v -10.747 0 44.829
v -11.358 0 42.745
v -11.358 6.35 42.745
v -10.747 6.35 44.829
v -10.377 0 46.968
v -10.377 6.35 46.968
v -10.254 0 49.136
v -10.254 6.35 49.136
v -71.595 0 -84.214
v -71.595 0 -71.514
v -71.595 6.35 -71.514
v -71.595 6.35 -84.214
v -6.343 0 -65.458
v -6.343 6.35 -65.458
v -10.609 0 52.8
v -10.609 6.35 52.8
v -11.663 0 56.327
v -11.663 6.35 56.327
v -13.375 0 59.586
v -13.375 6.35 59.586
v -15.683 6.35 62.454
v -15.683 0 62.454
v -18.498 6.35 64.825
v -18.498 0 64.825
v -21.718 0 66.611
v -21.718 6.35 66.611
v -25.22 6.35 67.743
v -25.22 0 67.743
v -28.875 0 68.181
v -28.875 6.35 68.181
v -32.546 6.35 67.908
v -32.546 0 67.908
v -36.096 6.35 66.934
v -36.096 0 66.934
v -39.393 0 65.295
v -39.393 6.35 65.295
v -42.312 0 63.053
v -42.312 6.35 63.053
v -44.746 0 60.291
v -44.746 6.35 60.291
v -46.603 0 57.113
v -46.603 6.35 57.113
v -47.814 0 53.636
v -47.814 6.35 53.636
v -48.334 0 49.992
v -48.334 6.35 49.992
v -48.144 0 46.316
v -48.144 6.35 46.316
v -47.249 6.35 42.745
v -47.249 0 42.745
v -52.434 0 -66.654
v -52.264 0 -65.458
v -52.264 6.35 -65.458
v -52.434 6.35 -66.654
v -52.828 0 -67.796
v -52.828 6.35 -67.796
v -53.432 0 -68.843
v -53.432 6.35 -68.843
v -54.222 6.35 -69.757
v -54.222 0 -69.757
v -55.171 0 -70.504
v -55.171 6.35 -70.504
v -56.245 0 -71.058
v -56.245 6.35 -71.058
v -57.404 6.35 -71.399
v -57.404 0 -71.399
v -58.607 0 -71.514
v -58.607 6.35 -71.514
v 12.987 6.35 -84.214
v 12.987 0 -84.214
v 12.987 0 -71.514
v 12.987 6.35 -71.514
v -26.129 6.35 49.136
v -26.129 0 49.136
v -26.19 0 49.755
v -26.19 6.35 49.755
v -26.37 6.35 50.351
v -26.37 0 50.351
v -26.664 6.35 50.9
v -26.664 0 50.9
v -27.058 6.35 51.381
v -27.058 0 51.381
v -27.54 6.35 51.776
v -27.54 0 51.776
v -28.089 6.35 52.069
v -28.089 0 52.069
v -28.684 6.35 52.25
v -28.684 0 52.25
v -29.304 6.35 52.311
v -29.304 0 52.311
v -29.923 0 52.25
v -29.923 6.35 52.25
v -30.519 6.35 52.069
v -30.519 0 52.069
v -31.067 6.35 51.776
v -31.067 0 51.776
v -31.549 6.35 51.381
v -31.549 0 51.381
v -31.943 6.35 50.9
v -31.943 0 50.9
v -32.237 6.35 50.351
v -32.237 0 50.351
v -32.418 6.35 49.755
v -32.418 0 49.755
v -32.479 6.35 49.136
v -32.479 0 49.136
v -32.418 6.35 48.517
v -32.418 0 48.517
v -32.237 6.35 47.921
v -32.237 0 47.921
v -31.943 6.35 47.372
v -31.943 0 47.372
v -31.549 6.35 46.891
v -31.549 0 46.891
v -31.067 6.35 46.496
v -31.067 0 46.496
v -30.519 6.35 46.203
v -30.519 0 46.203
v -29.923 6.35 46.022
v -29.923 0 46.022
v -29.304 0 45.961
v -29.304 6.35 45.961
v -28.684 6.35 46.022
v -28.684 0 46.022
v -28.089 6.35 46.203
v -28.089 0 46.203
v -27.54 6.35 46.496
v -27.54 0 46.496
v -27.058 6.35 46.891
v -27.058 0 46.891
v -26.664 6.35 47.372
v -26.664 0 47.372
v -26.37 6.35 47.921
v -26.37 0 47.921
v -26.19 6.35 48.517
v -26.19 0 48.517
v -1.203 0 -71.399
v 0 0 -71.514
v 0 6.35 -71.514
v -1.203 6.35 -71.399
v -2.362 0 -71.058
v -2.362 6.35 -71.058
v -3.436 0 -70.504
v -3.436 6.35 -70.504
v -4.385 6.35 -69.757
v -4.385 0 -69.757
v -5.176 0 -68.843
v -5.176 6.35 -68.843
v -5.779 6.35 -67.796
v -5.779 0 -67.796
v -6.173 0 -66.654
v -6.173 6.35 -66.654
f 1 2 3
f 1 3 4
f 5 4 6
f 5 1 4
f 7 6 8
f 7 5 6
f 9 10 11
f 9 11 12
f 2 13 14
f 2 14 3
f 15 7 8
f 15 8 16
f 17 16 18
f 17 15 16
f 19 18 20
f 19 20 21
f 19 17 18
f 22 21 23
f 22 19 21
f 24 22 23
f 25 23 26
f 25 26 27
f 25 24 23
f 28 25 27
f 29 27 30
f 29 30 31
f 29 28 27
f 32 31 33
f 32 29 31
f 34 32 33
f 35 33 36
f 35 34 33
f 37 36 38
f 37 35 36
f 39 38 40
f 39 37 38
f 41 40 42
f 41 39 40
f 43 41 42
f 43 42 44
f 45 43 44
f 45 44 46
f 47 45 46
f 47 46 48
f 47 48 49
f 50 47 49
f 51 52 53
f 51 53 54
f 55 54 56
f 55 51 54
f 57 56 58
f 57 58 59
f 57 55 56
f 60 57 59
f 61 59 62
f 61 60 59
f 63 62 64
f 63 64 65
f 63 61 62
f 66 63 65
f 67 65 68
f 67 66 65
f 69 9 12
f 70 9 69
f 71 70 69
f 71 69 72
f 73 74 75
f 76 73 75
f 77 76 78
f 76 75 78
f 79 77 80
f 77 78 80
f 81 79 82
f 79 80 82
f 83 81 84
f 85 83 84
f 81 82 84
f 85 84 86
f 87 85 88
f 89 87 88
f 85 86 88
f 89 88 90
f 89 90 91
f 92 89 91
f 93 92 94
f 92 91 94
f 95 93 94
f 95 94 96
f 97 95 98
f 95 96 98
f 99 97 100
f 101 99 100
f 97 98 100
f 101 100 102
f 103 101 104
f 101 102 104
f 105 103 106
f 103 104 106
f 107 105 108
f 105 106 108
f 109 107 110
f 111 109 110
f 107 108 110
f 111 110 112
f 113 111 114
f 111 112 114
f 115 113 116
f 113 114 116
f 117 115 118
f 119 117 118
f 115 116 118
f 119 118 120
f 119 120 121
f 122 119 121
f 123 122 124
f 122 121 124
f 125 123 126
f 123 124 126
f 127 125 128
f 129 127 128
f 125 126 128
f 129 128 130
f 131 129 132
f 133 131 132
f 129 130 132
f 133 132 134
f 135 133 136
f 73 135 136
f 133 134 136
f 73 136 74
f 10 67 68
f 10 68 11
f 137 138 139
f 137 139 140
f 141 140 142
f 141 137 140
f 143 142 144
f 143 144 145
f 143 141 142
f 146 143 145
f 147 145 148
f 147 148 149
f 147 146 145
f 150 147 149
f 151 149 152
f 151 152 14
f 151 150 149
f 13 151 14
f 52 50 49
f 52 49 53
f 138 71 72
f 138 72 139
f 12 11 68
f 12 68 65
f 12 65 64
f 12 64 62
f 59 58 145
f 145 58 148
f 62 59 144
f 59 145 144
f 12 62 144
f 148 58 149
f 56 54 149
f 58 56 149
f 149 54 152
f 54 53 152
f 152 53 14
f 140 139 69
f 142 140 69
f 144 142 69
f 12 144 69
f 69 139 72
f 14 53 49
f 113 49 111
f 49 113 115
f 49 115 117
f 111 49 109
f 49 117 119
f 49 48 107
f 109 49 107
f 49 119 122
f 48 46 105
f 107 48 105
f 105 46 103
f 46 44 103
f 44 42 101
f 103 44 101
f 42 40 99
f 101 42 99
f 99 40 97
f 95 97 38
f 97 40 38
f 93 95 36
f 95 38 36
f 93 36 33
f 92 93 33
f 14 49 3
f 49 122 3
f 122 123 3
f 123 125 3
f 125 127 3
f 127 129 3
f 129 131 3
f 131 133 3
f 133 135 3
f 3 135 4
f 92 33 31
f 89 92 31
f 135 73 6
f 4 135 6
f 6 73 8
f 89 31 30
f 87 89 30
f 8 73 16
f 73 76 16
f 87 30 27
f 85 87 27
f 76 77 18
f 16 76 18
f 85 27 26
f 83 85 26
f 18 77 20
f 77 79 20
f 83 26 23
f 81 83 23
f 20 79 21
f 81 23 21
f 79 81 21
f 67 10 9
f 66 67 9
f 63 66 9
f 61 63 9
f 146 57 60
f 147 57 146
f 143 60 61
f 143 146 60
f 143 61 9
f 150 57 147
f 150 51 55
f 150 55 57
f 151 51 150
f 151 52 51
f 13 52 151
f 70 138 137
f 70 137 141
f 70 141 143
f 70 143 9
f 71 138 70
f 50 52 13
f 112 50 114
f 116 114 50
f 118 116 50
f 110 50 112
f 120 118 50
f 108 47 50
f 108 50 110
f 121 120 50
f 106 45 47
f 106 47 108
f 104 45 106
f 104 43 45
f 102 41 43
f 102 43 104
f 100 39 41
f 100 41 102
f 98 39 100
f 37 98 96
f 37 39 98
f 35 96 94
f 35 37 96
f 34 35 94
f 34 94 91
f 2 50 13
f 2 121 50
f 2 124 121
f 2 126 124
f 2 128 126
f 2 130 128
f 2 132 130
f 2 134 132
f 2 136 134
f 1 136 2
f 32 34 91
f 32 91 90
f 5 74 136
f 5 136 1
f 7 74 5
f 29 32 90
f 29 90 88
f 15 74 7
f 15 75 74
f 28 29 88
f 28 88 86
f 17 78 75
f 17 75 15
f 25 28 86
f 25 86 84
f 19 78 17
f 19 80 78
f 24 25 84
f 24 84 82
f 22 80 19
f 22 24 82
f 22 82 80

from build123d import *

# Parameters (mm, degrees)
F0_R     = 3.175
F1_DEPTH = 6.35


with BuildPart() as f1:
    # F0 (on Front) → F1 (new body)
    with BuildSketch(Plane.XZ):
        with BuildLine():
            Line((-71.594537, -71.514018), (-71.594537, -84.214018))
            Line((-71.594537, -84.214018), (12.987463, -84.214018))
            Line((12.987463, -84.214018), (12.987463, -71.514018))
            Line((12.987463, -71.514018), (0, -71.514018))
            ThreePointArc((0, -71.514018), (-4.384965, -69.756902), (-6.343192, -65.45798))
            Line((-6.343192, -65.45798), (-11.357634, 42.74481))
            ThreePointArc((-11.357634, 42.74481), (-29.303537, 30.085982), (-47.24944, 42.74481))
            Line((-47.24944, 42.74481), (-52.263882, -65.45798))
            ThreePointArc((-52.263882, -65.45798), (-54.222109, -69.756902), (-58.607074, -71.514018))
            Line((-58.607074, -71.514018), (-71.594537, -71.514018))
        make_face()
        with BuildLine():
            ThreePointArc((-10.253537, 49.135982), (-32.546457, 67.907929), (-47.24944, 42.74481))
            ThreePointArc((-47.24944, 42.74481), (-29.303537, 30.085982), (-11.357634, 42.74481))
            ThreePointArc((-11.357634, 42.74481), (-10.531591, 45.893063), (-10.253537, 49.135982))
        make_face()
        with Locations((-29.303537, 49.135982)):
            Circle(F0_R, mode=Mode.SUBTRACT)
    extrude(amount=-F1_DEPTH)


solid = f1.part
